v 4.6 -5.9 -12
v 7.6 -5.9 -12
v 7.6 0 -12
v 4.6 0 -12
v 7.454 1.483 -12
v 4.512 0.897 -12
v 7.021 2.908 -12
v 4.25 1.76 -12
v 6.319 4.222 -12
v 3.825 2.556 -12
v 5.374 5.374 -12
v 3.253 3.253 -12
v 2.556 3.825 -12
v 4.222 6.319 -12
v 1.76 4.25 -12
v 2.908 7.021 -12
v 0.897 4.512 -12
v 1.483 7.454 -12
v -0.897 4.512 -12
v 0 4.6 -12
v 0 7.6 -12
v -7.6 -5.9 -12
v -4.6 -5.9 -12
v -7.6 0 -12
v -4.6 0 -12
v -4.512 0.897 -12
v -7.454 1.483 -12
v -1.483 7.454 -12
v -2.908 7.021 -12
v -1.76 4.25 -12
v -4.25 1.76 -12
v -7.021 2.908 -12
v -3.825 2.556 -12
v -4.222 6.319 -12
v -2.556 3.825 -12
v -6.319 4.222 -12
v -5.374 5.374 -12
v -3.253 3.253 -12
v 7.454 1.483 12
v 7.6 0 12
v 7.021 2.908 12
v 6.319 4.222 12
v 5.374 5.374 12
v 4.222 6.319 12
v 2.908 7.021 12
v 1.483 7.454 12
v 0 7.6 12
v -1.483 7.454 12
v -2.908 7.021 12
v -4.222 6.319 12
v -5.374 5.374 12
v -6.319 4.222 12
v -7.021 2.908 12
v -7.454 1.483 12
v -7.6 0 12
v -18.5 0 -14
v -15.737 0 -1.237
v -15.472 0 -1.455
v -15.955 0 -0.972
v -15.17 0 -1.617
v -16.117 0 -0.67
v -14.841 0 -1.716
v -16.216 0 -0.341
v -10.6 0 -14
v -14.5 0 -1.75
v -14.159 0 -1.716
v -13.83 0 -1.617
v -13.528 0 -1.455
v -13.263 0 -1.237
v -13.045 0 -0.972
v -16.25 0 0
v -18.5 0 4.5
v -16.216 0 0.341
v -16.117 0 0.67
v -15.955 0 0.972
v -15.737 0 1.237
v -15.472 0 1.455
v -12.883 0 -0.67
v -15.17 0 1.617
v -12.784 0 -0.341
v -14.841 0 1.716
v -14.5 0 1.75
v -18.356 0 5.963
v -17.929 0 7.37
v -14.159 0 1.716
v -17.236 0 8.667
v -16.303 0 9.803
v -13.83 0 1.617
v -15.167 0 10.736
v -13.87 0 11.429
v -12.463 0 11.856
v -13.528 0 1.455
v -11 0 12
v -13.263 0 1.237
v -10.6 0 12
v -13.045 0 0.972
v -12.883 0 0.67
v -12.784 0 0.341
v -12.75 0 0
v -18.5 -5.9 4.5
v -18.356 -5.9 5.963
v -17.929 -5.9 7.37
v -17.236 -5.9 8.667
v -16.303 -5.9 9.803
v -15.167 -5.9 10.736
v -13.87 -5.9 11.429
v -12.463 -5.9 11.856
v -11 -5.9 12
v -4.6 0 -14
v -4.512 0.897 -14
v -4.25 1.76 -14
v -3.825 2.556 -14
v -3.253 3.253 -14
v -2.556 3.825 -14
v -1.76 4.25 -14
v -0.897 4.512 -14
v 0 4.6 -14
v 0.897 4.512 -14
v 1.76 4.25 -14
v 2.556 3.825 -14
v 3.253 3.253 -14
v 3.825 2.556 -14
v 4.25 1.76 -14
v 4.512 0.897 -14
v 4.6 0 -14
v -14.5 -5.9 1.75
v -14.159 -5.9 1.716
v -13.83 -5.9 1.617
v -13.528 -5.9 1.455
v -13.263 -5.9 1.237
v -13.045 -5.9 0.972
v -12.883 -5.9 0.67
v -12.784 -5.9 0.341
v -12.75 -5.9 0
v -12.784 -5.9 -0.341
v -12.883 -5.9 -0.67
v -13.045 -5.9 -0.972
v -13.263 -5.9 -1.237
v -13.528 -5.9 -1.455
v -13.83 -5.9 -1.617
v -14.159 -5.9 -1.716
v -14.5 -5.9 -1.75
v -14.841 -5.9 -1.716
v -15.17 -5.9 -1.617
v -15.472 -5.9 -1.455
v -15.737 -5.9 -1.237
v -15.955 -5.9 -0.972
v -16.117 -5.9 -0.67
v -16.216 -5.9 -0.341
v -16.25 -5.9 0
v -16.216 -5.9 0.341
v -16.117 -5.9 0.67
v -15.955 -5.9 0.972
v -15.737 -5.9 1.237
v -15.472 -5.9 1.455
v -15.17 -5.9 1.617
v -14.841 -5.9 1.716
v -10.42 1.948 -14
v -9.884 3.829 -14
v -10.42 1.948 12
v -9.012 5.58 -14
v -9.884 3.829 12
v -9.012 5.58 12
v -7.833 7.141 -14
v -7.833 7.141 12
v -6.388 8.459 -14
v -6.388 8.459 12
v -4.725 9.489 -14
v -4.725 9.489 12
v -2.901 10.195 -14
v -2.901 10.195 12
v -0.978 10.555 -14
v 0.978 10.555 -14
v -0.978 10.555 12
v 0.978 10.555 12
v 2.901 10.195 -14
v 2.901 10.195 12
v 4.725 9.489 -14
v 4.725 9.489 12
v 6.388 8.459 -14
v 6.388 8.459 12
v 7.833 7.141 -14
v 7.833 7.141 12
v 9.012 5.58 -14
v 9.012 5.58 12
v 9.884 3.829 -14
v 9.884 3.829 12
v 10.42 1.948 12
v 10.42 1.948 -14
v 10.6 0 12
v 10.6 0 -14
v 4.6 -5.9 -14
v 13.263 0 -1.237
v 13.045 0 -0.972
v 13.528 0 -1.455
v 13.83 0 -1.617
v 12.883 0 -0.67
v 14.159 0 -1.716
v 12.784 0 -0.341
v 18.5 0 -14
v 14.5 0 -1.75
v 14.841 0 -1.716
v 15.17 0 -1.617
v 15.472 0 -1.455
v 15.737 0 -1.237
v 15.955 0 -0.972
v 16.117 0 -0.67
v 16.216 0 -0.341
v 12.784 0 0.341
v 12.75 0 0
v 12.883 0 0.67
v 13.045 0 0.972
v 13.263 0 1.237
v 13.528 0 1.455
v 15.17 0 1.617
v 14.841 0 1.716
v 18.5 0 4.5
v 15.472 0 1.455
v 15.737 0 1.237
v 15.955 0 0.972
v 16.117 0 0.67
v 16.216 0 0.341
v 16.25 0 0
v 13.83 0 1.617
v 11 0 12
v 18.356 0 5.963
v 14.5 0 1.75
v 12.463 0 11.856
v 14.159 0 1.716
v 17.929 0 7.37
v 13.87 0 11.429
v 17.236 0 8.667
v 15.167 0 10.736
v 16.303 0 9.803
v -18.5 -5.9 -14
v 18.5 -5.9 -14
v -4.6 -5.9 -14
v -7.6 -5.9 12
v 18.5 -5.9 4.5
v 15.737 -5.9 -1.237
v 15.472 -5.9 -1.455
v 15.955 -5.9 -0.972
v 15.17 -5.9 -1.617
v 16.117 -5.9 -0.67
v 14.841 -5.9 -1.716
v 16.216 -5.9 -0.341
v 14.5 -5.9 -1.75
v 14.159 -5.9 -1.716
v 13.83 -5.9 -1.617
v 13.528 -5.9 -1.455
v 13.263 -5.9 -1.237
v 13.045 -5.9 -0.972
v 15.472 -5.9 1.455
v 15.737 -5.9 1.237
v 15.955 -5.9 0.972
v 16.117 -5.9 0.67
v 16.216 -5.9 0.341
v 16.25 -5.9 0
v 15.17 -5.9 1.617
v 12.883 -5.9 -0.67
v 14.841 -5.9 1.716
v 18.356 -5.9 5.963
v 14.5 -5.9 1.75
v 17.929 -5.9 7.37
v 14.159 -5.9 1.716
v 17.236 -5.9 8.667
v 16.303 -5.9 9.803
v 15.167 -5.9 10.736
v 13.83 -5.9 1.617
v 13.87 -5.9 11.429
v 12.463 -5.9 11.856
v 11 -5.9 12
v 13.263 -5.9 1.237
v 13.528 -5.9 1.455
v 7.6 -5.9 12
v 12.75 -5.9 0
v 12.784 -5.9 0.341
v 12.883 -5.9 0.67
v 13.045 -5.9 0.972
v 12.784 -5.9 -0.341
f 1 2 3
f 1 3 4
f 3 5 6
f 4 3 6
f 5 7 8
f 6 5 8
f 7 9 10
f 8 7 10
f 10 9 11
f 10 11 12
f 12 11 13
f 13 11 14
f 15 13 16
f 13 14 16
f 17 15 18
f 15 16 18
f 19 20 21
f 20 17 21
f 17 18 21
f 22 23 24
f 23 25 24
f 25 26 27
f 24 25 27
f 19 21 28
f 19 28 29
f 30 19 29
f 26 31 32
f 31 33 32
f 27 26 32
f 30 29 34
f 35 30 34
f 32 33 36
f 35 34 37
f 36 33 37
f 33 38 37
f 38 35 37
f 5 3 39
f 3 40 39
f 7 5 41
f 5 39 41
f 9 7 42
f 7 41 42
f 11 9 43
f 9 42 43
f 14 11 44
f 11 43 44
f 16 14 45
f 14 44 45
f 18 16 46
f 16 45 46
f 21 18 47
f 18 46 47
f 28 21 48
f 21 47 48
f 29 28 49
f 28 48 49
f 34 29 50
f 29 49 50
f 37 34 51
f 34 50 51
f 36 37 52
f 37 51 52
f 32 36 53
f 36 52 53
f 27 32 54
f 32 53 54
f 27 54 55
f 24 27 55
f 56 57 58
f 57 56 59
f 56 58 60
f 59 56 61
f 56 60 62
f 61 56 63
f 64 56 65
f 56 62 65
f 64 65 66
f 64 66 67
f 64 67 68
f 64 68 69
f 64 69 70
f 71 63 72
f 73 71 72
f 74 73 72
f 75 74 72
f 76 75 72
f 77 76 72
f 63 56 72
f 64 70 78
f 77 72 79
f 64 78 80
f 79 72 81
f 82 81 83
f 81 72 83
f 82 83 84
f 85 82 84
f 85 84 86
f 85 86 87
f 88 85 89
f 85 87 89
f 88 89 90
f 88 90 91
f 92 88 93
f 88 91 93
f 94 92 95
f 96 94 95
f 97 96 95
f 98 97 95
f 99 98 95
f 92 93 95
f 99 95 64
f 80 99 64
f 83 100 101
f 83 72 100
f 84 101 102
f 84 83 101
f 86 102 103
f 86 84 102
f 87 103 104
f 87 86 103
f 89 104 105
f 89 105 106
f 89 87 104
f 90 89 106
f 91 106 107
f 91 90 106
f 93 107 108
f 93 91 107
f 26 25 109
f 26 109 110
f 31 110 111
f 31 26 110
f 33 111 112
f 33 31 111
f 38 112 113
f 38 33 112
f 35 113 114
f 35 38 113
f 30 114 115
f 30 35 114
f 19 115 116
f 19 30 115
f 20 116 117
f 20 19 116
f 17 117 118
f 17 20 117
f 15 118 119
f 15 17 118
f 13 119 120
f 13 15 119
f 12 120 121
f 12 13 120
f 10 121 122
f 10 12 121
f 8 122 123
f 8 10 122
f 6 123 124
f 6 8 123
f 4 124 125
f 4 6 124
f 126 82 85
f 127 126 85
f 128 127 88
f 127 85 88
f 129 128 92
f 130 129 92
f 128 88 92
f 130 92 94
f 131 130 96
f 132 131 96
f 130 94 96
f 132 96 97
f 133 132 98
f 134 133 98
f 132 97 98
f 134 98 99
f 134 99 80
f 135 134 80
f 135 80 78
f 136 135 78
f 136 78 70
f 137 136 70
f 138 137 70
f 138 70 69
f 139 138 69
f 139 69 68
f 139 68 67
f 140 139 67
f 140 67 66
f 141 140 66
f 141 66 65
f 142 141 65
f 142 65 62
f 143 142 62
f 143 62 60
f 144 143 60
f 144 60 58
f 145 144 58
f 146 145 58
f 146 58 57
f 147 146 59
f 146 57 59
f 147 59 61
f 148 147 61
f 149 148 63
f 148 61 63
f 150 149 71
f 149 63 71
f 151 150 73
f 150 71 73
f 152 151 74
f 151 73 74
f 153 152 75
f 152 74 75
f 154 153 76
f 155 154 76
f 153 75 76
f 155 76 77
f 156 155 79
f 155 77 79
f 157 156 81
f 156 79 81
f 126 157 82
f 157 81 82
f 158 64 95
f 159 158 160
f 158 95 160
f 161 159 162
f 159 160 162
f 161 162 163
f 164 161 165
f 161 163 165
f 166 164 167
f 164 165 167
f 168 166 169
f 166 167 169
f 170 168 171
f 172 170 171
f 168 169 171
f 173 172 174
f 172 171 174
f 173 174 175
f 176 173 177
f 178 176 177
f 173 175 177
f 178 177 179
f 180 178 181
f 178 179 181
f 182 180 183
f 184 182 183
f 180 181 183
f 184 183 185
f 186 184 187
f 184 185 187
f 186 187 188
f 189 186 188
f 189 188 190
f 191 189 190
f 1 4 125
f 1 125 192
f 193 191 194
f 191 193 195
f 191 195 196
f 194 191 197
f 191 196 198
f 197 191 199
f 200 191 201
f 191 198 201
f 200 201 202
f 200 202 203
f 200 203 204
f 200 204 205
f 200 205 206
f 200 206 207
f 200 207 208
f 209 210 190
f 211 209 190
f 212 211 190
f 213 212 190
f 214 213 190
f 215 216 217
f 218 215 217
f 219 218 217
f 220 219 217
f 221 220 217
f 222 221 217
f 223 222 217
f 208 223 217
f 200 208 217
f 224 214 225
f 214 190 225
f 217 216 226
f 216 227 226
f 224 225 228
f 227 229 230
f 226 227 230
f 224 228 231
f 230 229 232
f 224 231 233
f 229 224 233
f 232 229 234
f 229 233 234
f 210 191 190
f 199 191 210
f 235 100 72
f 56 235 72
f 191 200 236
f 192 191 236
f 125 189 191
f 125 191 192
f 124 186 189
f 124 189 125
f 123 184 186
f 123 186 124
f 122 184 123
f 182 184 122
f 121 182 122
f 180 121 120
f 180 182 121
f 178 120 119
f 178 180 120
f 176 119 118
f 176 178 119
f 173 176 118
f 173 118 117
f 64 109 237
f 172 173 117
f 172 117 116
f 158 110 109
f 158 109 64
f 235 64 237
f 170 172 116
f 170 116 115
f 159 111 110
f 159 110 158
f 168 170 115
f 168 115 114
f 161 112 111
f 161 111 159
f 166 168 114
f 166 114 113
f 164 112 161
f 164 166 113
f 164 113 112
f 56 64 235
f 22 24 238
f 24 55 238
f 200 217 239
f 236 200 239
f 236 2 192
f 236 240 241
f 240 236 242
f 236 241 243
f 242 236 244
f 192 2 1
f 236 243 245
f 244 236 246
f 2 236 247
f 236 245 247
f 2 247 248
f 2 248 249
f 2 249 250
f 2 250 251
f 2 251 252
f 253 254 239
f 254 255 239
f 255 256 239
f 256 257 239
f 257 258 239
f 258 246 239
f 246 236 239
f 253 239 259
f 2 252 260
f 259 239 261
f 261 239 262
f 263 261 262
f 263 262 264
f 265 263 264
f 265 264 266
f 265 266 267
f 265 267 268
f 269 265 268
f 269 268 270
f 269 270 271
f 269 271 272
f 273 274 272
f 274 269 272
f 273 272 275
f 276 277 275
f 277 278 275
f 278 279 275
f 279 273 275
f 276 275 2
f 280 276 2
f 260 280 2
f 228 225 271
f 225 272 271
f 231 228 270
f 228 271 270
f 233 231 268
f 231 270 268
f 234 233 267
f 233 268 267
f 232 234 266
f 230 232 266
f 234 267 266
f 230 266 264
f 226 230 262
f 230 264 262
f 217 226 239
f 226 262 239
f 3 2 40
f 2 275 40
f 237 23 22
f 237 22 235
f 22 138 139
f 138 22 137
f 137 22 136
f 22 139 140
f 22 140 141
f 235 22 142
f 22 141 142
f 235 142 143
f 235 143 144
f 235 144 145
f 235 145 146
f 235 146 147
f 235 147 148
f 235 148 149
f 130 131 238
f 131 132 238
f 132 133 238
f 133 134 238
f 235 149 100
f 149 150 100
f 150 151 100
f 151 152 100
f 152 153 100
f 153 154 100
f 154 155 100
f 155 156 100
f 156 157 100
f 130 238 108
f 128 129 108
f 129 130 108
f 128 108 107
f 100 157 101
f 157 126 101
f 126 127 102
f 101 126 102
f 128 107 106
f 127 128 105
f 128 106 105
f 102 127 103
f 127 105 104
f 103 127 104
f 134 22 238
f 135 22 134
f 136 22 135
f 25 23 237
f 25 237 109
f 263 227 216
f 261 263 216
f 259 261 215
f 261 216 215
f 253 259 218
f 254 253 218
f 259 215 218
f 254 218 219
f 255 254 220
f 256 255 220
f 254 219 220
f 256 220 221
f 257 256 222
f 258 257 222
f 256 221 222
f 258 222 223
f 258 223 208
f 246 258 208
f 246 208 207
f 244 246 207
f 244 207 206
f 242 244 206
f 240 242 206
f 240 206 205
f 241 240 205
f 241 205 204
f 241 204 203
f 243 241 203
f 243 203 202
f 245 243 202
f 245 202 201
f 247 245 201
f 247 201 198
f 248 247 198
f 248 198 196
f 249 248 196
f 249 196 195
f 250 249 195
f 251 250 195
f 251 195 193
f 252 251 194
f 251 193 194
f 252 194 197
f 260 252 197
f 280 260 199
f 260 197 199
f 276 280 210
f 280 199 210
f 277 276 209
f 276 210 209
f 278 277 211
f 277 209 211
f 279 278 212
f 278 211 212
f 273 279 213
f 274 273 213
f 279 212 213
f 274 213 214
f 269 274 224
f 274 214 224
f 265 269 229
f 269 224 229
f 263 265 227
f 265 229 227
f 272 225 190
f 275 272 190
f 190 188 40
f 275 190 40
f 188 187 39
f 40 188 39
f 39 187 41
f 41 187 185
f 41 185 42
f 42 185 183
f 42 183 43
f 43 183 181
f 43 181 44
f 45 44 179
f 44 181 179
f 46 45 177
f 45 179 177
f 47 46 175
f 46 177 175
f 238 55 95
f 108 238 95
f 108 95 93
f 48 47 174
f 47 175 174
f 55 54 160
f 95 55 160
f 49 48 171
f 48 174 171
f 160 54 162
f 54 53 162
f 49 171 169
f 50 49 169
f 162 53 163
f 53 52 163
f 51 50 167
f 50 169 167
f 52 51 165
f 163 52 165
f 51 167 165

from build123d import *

# Parameters (mm, degrees)
DODANIE_WYCI_GNI_CIE1_DEPTH = 12
DODANIE_WYCI_GNI_CIE2_DEPTH = 2
WYTNIJ_WYCI_GNI_CIE1_REACH  = 27.507
SZKIC3_R                    = 1.75
ZAOKR_GLENIE1_R             = 7.5


with BuildPart() as part:
    # Szkic1 → Dodanie-wyciągnięcie1 (new, symmetric)
    with BuildSketch(Plane.XY):
        with BuildLine():
            ThreePointArc((-10.6, 0), (0, 10.6), (10.6, 0))
            Line((10.6, 0), (18.5, 0))
            Line((18.5, 0), (18.5, -5.9))
            Line((18.5, -5.9), (7.6, -5.9))
            Line((7.6, -5.9), (7.6, 0))
            ThreePointArc((7.6, 0), (0, 7.6), (-7.6, 0))
            Line((-7.6, 0), (-7.6, -5.9))
            Line((-7.6, -5.9), (-18.5, -5.9))
            Line((-18.5, -5.9), (-18.5, 0))
            Line((-18.5, 0), (-10.6, 0))
        make_face()
    extrude(amount=DODANIE_WYCI_GNI_CIE1_DEPTH, both=True)

    # Szkic2 → Dodanie-wyciągnięcie2 (add)
    with BuildSketch(Plane(origin=(0, 0, -12), x_dir=(-1, 0, 0), z_dir=(0, 0, -1))):
        with BuildLine():
            Line((18.5, 0), (10.6, 0))
            ThreePointArc((10.6, 0), (0, 10.6), (-10.6, 0))
            Line((-10.6, 0), (-18.5, 0))
            Line((-18.5, 0), (-18.5, -5.9))
            Line((-18.5, -5.9), (-7.6, -5.9))
            Line((-7.6, -5.9), (-7.6, 0))
            ThreePointArc((-7.6, 0), (0, 7.6), (7.6, 0))
            Line((7.6, 0), (7.6, -5.9))
            Line((7.6, -5.9), (18.5, -5.9))
            Line((18.5, -5.9), (18.5, 0))
        make_face()
        with BuildLine():
            ThreePointArc((4.6, 0), (0, 4.6), (-4.6, 0))
            Line((-4.6, 0), (-4.6, -5.9))
            Line((-4.6, -5.9), (-7.6, -5.9))
            Line((-7.6, -5.9), (-7.6, 0))
            ThreePointArc((-7.6, 0), (0, 7.6), (7.6, 0))
            Line((7.6, 0), (7.6, -5.9))
            Line((7.6, -5.9), (4.6, -5.9))
            Line((4.6, -5.9), (4.6, 0))
        make_face()
    extrude(amount=DODANIE_WYCI_GNI_CIE2_DEPTH)

    # Szkic3 → Wytnij-wyciągnięcie1 (cut, up to next)
    with BuildSketch(Plane(origin=(0, 0, 0), x_dir=(1, 0, 0), z_dir=(0, 1, 0)), mode=Mode.PRIVATE) as wytnij_wyci_gni_cie1_sk1:
        with Locations(Location((-14.5, 0, 0), (0, 0, 270))):
            Circle(SZKIC3_R)
    wytnij_wyci_gni_cie1_tool1 = extrude(wytnij_wyci_gni_cie1_sk1.sketch, amount=-WYTNIJ_WYCI_GNI_CIE1_REACH, mode=Mode.PRIVATE) & part.part
    # Szkic3 → Wytnij-wyciągnięcie1 (cut, up to next)
    with BuildSketch(Plane(origin=(0, 0, 0), x_dir=(1, 0, 0), z_dir=(0, 1, 0)), mode=Mode.PRIVATE) as wytnij_wyci_gni_cie1_sk2:
        with Locations(Location((14.5, 0, 0), (0, 0, 270))):
            Circle(SZKIC3_R)
    wytnij_wyci_gni_cie1_tool2 = extrude(wytnij_wyci_gni_cie1_sk2.sketch, amount=-WYTNIJ_WYCI_GNI_CIE1_REACH, mode=Mode.PRIVATE) & part.part
    add(wytnij_wyci_gni_cie1_tool1.solids().sort_by_distance((-14.5, 0, 0))[0], mode=Mode.SUBTRACT)
    add(wytnij_wyci_gni_cie1_tool2.solids().sort_by_distance((14.5, 0, 0))[0], mode=Mode.SUBTRACT)

    # Zaokrąglenie1
    zaokr_glenie1_edges = [part.edges().sort_by_distance(p)[0] for p in [
        (-18.5, -2.95, 12),
        (18.5, -2.95, 12),
    ]]
    fillet(zaokr_glenie1_edges, radius=ZAOKR_GLENIE1_R)


solid = part.part
